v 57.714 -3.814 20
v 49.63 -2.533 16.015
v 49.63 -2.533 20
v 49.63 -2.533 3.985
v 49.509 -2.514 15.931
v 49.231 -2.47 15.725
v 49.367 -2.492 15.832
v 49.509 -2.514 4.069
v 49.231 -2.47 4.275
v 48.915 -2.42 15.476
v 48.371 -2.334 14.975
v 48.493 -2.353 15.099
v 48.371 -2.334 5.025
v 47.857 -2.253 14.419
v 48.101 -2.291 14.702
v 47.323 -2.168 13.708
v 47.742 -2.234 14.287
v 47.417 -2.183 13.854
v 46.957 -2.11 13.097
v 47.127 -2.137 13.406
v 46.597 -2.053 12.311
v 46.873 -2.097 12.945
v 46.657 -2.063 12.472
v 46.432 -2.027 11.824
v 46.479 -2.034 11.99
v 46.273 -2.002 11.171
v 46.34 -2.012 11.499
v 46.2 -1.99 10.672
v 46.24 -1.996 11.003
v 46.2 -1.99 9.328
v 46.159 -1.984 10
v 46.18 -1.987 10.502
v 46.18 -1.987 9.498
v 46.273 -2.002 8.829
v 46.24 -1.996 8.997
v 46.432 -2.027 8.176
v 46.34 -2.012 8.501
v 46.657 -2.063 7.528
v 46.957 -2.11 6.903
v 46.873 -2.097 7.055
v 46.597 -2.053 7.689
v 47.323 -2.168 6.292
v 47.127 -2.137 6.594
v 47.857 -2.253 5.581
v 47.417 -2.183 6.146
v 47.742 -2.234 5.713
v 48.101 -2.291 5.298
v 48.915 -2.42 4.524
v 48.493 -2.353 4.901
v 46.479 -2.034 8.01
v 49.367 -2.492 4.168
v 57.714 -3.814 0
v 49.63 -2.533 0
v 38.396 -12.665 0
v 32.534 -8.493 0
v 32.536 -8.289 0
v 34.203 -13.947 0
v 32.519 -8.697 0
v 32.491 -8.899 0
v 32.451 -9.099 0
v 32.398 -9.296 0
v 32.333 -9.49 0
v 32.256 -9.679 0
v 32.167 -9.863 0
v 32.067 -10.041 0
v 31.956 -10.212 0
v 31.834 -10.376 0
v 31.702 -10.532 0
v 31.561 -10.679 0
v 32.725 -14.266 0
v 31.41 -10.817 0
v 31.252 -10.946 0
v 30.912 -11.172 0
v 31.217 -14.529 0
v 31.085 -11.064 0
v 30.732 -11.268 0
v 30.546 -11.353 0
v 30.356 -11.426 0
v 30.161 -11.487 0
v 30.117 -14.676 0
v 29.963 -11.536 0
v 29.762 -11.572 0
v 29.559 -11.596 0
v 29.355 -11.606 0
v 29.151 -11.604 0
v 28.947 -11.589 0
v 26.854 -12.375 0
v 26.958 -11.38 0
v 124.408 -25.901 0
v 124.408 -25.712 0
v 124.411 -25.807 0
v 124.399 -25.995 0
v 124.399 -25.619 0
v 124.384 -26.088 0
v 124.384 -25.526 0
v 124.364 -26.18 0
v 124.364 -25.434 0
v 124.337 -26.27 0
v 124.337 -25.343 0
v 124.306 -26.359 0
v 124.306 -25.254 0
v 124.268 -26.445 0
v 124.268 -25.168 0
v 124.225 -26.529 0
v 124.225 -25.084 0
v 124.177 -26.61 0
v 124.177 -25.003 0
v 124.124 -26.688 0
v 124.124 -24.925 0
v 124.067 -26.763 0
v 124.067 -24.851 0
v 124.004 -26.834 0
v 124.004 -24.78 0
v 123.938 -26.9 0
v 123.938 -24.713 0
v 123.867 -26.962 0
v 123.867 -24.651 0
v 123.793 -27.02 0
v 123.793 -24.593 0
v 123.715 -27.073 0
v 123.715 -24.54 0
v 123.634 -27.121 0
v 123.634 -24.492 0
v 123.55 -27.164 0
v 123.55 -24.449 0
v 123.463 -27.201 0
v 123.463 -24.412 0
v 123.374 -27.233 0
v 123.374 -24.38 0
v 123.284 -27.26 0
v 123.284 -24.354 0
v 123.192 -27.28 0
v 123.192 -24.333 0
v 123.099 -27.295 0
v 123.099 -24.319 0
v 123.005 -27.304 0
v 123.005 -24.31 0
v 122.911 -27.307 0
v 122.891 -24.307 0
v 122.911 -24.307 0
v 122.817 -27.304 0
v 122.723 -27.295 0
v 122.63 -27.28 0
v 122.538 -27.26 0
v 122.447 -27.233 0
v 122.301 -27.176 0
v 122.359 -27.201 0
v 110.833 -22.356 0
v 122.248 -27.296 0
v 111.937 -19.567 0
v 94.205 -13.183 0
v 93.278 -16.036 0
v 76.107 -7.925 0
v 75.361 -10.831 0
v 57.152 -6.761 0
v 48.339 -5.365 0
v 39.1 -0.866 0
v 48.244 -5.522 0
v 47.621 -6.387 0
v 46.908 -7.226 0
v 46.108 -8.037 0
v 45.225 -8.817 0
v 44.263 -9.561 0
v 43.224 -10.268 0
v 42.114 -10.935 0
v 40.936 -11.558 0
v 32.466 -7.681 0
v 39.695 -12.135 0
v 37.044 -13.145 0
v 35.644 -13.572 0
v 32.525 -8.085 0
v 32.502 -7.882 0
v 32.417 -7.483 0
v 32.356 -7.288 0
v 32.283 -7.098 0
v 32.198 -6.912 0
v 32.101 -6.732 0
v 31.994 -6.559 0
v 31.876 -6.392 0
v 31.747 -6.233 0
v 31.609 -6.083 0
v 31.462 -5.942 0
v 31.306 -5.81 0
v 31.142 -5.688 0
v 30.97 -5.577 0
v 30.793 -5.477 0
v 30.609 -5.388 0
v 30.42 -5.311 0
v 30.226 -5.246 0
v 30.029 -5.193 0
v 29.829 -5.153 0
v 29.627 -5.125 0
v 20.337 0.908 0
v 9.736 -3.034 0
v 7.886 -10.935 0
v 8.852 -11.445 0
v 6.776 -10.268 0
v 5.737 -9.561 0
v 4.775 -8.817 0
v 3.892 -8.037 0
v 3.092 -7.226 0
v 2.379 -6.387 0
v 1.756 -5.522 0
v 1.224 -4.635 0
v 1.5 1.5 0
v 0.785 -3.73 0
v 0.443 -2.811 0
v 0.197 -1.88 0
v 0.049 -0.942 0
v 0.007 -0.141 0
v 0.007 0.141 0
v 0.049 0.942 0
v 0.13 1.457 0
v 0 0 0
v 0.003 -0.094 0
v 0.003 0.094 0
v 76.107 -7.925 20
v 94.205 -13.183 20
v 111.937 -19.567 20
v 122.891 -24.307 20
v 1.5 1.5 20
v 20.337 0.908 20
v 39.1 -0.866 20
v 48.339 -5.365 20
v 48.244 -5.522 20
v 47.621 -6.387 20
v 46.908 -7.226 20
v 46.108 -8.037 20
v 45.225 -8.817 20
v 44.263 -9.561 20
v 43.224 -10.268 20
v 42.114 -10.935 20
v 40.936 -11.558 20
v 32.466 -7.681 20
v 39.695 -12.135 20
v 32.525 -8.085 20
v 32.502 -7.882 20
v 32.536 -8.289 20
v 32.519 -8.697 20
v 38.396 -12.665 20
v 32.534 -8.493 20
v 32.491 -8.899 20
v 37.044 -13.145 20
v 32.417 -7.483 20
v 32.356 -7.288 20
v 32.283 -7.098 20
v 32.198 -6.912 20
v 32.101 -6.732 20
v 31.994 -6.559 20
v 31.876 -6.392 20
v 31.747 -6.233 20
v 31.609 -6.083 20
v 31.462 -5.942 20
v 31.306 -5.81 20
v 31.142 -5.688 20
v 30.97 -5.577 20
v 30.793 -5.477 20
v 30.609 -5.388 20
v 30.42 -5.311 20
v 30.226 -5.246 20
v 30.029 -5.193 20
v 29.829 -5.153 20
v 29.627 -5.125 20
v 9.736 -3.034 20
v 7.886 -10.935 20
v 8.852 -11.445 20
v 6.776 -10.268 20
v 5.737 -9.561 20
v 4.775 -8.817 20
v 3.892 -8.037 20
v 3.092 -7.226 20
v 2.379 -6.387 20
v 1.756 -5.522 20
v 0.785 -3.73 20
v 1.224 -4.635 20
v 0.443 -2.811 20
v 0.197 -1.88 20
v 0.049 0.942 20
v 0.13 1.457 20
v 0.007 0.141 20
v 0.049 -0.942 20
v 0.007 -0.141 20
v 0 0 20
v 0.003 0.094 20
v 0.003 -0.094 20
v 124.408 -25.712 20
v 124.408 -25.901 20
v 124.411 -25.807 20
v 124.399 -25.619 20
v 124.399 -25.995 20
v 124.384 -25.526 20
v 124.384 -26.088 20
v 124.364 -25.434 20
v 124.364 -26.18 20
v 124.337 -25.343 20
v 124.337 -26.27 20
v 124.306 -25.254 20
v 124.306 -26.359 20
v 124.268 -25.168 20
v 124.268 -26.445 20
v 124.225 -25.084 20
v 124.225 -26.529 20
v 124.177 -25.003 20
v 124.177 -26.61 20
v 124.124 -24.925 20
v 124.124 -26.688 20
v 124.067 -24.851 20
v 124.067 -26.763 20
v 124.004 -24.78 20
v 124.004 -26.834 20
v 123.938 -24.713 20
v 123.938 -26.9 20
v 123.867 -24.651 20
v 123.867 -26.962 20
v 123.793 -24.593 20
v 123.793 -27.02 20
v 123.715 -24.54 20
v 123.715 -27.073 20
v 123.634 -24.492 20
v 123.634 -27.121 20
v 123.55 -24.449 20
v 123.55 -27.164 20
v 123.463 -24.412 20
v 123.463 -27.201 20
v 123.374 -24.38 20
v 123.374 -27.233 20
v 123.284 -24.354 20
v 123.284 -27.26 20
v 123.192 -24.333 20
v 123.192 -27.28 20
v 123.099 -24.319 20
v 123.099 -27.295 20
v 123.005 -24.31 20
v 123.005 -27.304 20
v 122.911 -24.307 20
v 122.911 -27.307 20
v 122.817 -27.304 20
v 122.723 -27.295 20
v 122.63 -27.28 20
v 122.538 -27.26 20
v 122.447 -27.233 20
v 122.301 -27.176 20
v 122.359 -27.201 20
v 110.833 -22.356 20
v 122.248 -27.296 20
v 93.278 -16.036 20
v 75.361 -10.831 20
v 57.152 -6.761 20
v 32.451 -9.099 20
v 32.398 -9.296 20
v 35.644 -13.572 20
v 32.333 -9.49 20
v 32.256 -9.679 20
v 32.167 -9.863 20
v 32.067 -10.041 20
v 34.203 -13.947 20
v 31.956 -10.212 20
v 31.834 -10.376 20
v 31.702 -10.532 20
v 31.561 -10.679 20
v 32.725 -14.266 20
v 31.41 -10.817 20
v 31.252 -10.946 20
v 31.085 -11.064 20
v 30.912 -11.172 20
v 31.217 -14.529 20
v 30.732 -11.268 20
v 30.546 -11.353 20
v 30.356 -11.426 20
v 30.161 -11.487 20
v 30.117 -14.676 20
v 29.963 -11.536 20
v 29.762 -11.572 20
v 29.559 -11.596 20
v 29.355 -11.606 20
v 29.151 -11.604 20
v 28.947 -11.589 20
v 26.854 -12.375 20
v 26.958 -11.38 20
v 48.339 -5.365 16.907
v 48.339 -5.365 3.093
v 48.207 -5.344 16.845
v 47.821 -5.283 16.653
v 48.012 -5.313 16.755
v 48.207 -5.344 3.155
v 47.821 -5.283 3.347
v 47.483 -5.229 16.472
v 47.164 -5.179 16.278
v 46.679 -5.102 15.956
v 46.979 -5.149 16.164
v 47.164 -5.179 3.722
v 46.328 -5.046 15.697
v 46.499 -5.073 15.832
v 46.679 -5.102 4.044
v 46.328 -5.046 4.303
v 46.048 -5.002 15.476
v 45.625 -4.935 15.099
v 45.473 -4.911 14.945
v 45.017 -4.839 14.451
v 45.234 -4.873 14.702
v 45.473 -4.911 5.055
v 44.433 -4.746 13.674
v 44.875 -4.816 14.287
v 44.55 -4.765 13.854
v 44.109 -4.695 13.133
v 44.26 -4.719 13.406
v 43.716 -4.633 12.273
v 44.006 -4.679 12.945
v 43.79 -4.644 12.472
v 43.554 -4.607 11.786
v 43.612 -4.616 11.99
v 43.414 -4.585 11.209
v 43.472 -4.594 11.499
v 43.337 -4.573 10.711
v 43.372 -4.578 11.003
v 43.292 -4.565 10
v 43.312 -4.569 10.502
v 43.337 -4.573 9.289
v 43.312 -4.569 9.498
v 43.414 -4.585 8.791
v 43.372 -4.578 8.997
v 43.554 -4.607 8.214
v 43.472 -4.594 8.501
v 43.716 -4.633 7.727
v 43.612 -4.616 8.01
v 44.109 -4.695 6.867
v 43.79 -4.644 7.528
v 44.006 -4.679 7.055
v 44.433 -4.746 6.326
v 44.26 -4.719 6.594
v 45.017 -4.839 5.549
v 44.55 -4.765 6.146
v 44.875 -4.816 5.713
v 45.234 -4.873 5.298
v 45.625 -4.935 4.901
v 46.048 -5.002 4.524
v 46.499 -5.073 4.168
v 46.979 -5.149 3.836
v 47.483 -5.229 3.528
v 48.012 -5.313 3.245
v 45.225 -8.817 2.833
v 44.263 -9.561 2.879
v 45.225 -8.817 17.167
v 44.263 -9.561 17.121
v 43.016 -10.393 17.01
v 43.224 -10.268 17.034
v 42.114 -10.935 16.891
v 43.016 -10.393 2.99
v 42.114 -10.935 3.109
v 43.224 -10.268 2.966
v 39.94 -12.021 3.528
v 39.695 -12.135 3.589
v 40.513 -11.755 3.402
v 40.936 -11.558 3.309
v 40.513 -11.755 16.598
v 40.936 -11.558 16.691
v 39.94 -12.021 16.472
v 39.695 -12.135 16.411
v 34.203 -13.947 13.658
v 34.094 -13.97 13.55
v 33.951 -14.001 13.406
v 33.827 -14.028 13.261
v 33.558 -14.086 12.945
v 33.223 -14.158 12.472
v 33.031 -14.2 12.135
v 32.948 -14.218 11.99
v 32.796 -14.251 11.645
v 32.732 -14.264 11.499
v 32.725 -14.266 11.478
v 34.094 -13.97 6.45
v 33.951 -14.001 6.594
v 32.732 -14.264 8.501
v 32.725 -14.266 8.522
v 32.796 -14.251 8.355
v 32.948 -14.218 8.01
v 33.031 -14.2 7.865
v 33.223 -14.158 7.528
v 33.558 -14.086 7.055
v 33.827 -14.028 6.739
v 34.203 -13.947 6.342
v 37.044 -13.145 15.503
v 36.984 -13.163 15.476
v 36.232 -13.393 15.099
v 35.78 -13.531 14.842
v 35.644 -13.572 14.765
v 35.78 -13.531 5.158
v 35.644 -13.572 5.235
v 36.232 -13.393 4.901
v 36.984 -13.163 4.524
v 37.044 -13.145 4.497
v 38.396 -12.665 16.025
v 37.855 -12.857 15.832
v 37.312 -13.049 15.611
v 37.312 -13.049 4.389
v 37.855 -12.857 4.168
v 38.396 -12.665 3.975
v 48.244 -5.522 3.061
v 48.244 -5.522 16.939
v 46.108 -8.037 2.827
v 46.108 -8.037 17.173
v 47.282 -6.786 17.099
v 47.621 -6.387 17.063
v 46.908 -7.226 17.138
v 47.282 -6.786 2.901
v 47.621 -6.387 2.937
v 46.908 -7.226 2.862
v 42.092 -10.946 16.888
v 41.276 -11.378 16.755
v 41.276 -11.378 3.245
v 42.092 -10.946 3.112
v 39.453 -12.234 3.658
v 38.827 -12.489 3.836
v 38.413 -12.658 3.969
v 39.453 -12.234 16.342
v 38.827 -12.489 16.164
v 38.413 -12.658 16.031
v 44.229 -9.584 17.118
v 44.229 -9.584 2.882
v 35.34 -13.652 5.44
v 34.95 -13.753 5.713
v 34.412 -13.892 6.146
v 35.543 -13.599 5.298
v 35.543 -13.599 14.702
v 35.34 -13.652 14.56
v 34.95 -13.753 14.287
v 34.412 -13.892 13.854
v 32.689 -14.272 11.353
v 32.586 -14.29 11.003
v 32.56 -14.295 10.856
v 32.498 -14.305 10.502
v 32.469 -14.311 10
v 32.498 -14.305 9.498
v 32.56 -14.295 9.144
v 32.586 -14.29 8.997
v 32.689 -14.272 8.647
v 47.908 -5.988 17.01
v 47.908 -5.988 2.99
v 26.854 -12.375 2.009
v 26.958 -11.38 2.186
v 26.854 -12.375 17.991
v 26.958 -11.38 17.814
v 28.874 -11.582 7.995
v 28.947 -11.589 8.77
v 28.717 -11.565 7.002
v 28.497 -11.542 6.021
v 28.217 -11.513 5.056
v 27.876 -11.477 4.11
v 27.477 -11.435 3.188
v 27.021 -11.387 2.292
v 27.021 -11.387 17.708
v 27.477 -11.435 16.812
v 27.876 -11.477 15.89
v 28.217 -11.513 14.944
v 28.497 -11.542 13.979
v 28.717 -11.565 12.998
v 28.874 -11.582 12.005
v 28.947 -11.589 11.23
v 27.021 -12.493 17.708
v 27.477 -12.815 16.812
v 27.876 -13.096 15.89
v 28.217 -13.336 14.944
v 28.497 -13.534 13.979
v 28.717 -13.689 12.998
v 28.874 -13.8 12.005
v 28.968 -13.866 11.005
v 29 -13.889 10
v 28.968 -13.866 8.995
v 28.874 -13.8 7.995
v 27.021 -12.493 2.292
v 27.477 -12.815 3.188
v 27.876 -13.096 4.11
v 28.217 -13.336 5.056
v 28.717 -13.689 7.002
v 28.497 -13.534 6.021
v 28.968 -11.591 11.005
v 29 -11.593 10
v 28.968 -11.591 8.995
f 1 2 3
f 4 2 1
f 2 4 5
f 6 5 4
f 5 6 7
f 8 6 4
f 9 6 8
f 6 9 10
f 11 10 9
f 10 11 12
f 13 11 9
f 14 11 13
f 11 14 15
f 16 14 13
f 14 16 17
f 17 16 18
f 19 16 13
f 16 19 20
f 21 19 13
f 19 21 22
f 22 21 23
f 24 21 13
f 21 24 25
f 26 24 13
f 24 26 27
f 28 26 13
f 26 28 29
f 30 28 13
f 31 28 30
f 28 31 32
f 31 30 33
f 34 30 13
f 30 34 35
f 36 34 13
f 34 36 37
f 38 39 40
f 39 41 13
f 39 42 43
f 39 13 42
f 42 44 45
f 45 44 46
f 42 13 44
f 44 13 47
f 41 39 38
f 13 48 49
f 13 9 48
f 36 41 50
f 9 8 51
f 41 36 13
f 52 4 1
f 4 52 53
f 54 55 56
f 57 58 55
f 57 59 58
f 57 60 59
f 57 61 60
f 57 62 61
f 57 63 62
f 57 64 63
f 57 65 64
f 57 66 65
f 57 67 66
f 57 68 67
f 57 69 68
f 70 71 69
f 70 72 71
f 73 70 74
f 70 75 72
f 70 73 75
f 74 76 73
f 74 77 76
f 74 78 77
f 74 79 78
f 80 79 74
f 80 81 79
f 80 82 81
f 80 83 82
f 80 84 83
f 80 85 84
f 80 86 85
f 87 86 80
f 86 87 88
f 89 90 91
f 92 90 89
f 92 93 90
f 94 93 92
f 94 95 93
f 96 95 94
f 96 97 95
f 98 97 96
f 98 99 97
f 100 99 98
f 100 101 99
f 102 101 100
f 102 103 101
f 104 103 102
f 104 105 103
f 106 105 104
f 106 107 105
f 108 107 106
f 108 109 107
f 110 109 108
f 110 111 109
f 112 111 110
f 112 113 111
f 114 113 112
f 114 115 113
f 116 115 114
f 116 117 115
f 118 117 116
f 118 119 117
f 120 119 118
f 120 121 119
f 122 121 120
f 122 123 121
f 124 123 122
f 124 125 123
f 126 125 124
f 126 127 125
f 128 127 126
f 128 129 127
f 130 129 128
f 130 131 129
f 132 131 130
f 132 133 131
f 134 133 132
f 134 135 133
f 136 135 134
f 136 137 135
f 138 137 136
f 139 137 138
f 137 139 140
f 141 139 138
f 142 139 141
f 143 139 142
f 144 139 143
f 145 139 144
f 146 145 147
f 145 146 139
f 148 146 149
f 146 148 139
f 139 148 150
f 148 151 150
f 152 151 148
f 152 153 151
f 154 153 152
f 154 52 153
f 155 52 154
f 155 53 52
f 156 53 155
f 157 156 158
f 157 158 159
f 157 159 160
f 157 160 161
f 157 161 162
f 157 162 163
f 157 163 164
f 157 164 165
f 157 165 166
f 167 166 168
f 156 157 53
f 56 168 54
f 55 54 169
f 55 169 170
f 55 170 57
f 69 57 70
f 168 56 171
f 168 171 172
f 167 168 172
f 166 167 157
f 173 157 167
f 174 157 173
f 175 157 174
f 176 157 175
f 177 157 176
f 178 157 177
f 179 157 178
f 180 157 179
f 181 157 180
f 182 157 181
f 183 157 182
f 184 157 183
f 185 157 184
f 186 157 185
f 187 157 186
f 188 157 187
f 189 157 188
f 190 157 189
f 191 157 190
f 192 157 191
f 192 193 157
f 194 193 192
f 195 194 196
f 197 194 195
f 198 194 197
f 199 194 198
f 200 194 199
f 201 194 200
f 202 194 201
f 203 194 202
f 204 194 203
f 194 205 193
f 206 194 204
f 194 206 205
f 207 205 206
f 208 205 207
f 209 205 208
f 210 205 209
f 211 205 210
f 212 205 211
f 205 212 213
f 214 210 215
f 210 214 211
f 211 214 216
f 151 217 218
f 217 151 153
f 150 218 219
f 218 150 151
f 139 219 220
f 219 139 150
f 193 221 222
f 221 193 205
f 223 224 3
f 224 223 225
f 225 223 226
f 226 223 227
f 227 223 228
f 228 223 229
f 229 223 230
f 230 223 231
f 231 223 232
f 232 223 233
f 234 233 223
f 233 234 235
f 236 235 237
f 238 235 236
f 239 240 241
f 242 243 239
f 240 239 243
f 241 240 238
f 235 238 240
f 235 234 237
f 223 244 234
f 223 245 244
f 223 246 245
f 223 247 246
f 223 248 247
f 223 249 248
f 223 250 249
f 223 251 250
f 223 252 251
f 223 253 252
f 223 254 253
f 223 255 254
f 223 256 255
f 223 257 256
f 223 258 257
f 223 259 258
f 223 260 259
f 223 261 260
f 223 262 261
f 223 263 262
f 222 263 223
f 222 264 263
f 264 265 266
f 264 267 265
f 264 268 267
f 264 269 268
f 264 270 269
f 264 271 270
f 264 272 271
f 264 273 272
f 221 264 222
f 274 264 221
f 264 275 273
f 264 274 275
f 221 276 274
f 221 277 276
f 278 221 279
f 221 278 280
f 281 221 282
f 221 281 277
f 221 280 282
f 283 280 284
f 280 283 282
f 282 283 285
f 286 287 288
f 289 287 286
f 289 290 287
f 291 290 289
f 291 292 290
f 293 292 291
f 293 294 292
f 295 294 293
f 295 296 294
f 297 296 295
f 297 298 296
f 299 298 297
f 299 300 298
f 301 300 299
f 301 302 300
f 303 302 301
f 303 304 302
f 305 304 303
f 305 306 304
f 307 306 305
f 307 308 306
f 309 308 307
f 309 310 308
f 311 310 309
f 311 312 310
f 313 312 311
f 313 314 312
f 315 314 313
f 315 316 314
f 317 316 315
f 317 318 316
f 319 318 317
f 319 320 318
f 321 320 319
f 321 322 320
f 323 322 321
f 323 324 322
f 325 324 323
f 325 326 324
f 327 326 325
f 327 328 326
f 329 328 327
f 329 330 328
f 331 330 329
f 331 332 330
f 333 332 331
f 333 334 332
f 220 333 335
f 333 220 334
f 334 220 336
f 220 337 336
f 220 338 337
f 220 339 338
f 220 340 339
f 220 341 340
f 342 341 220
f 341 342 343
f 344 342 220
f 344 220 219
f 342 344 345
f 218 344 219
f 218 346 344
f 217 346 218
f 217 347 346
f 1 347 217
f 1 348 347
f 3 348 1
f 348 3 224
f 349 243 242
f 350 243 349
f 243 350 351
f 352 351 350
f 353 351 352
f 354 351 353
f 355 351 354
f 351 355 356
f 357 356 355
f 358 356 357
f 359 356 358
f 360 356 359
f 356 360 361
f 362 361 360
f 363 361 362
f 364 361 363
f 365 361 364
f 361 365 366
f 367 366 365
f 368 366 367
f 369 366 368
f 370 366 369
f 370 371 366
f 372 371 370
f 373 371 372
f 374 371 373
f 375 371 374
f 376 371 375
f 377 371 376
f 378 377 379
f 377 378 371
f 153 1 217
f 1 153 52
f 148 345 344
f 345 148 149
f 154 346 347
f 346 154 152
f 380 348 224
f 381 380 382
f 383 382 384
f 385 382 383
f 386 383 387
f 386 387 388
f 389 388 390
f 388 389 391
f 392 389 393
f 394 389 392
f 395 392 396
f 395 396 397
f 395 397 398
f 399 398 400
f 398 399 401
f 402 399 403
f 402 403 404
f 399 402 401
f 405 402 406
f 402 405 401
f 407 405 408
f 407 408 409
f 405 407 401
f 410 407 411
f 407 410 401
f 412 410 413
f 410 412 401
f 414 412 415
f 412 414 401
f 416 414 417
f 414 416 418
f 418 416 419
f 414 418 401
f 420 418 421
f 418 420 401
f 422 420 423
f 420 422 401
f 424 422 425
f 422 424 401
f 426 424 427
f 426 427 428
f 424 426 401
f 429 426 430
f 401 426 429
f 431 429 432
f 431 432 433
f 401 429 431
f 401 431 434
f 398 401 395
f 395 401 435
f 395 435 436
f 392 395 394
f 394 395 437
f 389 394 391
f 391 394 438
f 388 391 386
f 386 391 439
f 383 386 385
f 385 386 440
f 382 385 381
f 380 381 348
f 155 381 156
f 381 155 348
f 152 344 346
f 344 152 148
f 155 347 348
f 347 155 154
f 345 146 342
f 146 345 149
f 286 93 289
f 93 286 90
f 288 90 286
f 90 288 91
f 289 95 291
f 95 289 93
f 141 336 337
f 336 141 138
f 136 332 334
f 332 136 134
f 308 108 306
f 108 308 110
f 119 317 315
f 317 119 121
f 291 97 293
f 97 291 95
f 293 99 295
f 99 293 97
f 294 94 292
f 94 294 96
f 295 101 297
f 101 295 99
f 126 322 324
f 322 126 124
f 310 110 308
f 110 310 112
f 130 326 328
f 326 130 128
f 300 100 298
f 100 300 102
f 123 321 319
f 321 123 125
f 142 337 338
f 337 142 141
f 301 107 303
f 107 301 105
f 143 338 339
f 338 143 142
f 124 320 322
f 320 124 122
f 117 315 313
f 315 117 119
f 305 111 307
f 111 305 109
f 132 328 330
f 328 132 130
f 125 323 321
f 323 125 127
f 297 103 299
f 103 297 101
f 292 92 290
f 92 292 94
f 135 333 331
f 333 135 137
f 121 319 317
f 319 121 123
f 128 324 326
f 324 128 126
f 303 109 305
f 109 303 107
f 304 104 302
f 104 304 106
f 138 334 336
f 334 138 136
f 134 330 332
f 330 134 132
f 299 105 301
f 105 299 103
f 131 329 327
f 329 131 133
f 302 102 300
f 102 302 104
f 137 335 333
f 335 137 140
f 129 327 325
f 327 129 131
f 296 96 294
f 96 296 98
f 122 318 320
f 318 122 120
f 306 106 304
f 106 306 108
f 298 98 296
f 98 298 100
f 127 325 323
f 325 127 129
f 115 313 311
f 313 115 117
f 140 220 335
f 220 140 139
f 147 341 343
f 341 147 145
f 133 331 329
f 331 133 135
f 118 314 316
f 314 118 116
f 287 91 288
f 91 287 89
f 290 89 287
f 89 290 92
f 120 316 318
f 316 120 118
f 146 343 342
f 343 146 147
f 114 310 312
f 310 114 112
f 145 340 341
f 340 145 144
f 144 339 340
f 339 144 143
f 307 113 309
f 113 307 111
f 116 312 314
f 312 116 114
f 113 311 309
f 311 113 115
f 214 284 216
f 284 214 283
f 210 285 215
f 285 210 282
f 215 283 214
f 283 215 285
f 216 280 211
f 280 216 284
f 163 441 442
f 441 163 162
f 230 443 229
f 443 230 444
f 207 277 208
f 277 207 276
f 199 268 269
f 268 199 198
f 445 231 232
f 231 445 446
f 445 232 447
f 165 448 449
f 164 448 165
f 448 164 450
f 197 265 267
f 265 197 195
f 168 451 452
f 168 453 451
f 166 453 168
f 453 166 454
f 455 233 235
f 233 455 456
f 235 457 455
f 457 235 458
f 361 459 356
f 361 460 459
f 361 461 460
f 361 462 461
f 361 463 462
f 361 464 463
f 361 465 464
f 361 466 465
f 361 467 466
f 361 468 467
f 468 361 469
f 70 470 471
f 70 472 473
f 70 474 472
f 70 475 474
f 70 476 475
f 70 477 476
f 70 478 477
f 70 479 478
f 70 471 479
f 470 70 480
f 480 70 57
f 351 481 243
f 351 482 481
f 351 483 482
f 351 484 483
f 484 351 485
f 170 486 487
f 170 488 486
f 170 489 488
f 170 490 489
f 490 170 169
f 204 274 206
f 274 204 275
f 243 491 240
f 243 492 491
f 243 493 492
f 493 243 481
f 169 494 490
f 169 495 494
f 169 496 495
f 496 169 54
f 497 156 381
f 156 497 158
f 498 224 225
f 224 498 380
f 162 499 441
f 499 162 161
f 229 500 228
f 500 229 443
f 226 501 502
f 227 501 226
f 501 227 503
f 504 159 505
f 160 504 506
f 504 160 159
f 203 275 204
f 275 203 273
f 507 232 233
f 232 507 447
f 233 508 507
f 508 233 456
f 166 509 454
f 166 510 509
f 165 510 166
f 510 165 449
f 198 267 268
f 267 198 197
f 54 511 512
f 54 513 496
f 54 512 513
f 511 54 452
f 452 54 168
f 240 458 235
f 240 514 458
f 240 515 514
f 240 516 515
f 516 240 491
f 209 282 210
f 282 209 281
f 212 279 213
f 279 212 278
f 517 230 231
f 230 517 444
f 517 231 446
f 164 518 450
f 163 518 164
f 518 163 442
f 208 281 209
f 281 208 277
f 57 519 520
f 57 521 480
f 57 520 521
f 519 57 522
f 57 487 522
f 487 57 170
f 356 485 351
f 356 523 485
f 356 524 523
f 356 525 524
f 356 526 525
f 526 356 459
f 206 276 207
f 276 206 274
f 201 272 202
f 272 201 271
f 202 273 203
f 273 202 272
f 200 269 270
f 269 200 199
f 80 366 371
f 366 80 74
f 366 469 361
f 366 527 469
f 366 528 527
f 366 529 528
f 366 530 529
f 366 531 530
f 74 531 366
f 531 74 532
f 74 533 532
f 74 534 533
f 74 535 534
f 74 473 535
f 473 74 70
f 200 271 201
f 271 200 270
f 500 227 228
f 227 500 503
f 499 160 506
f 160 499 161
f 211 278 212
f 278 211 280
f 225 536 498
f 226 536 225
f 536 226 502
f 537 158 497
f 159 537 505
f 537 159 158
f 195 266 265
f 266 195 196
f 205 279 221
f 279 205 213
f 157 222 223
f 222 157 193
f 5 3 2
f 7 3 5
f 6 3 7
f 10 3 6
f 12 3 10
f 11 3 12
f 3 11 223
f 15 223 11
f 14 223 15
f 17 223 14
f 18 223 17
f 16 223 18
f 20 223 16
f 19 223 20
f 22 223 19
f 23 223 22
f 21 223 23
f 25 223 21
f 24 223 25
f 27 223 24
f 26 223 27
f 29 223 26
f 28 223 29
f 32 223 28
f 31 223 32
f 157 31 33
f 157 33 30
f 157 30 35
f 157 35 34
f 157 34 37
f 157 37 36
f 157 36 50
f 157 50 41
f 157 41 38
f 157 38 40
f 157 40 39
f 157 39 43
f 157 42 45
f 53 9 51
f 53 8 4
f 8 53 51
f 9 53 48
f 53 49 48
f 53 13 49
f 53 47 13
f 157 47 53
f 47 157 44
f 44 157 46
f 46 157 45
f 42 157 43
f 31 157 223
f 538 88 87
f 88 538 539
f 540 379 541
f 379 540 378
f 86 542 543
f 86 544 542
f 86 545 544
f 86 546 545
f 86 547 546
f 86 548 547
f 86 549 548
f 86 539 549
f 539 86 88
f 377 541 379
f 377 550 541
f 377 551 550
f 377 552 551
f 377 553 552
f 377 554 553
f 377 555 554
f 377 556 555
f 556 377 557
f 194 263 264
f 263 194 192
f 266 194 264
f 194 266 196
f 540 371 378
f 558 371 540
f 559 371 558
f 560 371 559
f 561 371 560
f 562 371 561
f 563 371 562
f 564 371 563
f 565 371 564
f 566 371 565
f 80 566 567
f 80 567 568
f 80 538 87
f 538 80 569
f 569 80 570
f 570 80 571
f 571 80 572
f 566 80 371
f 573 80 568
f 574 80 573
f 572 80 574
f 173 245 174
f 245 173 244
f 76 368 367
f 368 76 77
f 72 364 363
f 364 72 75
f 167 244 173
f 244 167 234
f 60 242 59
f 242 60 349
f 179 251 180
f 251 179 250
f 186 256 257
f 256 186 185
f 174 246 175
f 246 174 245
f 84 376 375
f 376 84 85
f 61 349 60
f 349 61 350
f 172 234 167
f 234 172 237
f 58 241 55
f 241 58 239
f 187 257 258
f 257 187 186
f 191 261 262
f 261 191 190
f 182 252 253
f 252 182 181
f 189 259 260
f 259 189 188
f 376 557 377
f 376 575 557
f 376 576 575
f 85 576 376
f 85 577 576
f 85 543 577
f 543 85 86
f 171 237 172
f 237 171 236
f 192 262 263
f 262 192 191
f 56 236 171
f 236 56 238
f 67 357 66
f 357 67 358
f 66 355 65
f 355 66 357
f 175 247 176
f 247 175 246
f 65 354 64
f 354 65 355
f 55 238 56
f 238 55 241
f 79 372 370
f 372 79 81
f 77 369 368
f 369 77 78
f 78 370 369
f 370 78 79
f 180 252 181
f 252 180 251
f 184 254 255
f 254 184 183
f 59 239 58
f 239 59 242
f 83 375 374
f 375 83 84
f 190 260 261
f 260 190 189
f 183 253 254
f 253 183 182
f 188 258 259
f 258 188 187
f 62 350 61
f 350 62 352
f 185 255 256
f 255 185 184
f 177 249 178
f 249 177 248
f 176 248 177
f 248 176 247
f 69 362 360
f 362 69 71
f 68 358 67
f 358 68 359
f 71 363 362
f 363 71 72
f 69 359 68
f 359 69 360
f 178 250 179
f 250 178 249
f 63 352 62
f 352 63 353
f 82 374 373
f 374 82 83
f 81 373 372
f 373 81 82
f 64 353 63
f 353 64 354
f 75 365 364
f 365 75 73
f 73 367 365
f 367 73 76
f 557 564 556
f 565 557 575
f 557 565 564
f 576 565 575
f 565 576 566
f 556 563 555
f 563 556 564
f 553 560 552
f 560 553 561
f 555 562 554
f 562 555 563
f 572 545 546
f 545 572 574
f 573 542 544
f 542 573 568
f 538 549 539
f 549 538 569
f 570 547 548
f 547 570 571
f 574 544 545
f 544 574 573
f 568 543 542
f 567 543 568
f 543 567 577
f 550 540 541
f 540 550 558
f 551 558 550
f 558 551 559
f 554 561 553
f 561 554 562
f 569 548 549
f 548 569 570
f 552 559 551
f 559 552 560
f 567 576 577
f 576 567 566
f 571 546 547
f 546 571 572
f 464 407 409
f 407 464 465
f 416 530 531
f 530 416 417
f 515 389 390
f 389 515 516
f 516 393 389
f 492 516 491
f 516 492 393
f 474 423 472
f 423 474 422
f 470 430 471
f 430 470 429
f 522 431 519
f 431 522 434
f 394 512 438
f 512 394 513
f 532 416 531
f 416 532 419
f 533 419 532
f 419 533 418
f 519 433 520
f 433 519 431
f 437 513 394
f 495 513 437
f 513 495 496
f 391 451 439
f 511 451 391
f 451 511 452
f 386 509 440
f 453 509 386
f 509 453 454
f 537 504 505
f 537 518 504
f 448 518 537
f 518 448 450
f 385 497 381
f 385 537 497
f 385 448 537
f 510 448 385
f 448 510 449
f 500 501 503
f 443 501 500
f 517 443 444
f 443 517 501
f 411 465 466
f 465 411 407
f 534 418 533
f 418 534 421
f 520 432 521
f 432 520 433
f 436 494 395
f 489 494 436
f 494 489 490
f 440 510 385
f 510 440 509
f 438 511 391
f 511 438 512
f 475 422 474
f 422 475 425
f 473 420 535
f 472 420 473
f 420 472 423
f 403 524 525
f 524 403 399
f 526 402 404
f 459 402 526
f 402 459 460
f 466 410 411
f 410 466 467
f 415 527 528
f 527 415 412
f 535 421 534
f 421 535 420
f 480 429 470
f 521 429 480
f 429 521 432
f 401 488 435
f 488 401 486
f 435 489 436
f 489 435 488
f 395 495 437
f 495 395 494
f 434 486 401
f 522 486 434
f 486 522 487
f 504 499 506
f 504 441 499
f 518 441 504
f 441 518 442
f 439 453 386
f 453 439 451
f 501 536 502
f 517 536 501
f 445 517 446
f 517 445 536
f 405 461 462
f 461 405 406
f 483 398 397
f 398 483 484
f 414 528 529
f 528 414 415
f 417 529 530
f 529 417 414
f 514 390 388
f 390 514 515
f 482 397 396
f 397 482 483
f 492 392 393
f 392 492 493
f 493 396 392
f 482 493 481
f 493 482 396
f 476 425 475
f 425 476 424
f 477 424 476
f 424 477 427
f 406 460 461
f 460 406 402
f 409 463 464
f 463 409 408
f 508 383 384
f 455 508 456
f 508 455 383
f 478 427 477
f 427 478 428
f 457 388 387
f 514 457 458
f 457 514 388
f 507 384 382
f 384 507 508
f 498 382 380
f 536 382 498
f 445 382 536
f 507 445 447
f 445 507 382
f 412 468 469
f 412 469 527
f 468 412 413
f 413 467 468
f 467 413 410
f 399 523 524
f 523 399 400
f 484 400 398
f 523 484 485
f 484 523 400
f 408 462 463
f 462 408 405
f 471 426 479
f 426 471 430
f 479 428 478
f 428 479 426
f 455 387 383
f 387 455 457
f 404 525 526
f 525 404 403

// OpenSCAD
// -----------------------------------------------------
// Flaschenoeffner
//
//  Detlev Ahlgrimm, 25.05.2019
// -----------------------------------------------------

include_text=0;  // [0:False, 1:True]

strg1="info@dg-cybersicherheit.de";
size1=7;

strg2="www.cyberscan.io";
size2=7;

$fn=100;

/* [Hidden] */
r=300;
a=24;
hgt=20;
ws=3;

$vpt=[128, 109, -73];
$vpr=[62, 0, 330];
$vpd=446;

xp=r*sin(a);
yp=r*cos(a);
translate([1.5, -r+yp+ws/2, 0]) {
  difference() {
    translate([0, -yp, 0]) difference() {
      cylinder(r=r, h=hgt);
      translate([0, 0, -0.1]) cylinder(r=r-ws, h=hgt+0.2);
    }
    translate([-r-0.1, -r-yp-0.1, -0.1]) cube([r+0.1, 2*r+0.2, hgt+0.2]);
    translate([-0.1, -r-yp-0.1, -0.1]) cube([r+0.2, r+0.1, hgt+0.2]);
    translate([0, -yp, -0.1]) rotate([0, 0, -a]) cube([r+0.1, r+0.1, hgt+0.2]);
  }
  translate([(r-ws/2)*sin(a), (r-ws/2)*cos(a)-yp, 0]) cylinder(d=ws, h=hgt);
  translate([(r-ws/2)*sin(0), (r-ws/2)*cos(0)-yp, 0]) cylinder(d=ws, h=hgt);
}

difference() {
  intersection() {
    translate([25, 0, 0]) scale([1, 0.6, 1]) cylinder(r=25, h=hgt);
    translate([1.5, -yp-r+yp+ws/2, 0]) cylinder(r=r, h=hgt);
  }
  rotate([0, 0, -6]) {
    translate([10, -19, -0.1]) linear_extrude(hgt+0.2) polygon([ [0,0], [0,17], [20,17], [20,10.5], [18,10.5], [18,9.5], [35,0] ]);
    translate([30, -19+17-6.5/2, -0.1]) cylinder(d=6.5, h=hgt+0.2);
  }
  translate([27, -30, hgt/2]) rotate([-90, 0, -2*a]) cylinder(d=hgt-4, h=50);
  translate([13, -8, hgt/2]) rotate([90, 0, 0]) intersection() {
    cylinder(d=32, h=10);
    translate([10, -16, -0.2]) cube([17, 32, 10.2]);
  }
}

if(include_text && len(strg1)>0) render() difference() {
  intersection() {
    translate([60, -23, hgt/2]) rotate([-90, 0, -a/2]) linear_extrude(32) text(strg1, size=size1, halign="center", valign="center");
    translate([1.5, -yp-r+yp+ws/2, 0]) cylinder(r=r+1, h=hgt);
  }
  translate([1.5, -yp-r+yp+ws/2, 0]) cylinder(r=r-1, h=hgt);
}

if(include_text && len(strg2)>0) render() difference() {
  intersection() {
    translate([85, 0, hgt/2]) rotate([90, 0, -a/2]) linear_extrude(25) text(strg2, size=size2, halign="center", valign="center");
    translate([1.5, -yp-r+yp+ws/2, 0]) cylinder(r=r, h=hgt);
  }
  translate([1.5, -yp-r+yp+ws/2, 0]) cylinder(r=r-ws-1, h=hgt);
}
